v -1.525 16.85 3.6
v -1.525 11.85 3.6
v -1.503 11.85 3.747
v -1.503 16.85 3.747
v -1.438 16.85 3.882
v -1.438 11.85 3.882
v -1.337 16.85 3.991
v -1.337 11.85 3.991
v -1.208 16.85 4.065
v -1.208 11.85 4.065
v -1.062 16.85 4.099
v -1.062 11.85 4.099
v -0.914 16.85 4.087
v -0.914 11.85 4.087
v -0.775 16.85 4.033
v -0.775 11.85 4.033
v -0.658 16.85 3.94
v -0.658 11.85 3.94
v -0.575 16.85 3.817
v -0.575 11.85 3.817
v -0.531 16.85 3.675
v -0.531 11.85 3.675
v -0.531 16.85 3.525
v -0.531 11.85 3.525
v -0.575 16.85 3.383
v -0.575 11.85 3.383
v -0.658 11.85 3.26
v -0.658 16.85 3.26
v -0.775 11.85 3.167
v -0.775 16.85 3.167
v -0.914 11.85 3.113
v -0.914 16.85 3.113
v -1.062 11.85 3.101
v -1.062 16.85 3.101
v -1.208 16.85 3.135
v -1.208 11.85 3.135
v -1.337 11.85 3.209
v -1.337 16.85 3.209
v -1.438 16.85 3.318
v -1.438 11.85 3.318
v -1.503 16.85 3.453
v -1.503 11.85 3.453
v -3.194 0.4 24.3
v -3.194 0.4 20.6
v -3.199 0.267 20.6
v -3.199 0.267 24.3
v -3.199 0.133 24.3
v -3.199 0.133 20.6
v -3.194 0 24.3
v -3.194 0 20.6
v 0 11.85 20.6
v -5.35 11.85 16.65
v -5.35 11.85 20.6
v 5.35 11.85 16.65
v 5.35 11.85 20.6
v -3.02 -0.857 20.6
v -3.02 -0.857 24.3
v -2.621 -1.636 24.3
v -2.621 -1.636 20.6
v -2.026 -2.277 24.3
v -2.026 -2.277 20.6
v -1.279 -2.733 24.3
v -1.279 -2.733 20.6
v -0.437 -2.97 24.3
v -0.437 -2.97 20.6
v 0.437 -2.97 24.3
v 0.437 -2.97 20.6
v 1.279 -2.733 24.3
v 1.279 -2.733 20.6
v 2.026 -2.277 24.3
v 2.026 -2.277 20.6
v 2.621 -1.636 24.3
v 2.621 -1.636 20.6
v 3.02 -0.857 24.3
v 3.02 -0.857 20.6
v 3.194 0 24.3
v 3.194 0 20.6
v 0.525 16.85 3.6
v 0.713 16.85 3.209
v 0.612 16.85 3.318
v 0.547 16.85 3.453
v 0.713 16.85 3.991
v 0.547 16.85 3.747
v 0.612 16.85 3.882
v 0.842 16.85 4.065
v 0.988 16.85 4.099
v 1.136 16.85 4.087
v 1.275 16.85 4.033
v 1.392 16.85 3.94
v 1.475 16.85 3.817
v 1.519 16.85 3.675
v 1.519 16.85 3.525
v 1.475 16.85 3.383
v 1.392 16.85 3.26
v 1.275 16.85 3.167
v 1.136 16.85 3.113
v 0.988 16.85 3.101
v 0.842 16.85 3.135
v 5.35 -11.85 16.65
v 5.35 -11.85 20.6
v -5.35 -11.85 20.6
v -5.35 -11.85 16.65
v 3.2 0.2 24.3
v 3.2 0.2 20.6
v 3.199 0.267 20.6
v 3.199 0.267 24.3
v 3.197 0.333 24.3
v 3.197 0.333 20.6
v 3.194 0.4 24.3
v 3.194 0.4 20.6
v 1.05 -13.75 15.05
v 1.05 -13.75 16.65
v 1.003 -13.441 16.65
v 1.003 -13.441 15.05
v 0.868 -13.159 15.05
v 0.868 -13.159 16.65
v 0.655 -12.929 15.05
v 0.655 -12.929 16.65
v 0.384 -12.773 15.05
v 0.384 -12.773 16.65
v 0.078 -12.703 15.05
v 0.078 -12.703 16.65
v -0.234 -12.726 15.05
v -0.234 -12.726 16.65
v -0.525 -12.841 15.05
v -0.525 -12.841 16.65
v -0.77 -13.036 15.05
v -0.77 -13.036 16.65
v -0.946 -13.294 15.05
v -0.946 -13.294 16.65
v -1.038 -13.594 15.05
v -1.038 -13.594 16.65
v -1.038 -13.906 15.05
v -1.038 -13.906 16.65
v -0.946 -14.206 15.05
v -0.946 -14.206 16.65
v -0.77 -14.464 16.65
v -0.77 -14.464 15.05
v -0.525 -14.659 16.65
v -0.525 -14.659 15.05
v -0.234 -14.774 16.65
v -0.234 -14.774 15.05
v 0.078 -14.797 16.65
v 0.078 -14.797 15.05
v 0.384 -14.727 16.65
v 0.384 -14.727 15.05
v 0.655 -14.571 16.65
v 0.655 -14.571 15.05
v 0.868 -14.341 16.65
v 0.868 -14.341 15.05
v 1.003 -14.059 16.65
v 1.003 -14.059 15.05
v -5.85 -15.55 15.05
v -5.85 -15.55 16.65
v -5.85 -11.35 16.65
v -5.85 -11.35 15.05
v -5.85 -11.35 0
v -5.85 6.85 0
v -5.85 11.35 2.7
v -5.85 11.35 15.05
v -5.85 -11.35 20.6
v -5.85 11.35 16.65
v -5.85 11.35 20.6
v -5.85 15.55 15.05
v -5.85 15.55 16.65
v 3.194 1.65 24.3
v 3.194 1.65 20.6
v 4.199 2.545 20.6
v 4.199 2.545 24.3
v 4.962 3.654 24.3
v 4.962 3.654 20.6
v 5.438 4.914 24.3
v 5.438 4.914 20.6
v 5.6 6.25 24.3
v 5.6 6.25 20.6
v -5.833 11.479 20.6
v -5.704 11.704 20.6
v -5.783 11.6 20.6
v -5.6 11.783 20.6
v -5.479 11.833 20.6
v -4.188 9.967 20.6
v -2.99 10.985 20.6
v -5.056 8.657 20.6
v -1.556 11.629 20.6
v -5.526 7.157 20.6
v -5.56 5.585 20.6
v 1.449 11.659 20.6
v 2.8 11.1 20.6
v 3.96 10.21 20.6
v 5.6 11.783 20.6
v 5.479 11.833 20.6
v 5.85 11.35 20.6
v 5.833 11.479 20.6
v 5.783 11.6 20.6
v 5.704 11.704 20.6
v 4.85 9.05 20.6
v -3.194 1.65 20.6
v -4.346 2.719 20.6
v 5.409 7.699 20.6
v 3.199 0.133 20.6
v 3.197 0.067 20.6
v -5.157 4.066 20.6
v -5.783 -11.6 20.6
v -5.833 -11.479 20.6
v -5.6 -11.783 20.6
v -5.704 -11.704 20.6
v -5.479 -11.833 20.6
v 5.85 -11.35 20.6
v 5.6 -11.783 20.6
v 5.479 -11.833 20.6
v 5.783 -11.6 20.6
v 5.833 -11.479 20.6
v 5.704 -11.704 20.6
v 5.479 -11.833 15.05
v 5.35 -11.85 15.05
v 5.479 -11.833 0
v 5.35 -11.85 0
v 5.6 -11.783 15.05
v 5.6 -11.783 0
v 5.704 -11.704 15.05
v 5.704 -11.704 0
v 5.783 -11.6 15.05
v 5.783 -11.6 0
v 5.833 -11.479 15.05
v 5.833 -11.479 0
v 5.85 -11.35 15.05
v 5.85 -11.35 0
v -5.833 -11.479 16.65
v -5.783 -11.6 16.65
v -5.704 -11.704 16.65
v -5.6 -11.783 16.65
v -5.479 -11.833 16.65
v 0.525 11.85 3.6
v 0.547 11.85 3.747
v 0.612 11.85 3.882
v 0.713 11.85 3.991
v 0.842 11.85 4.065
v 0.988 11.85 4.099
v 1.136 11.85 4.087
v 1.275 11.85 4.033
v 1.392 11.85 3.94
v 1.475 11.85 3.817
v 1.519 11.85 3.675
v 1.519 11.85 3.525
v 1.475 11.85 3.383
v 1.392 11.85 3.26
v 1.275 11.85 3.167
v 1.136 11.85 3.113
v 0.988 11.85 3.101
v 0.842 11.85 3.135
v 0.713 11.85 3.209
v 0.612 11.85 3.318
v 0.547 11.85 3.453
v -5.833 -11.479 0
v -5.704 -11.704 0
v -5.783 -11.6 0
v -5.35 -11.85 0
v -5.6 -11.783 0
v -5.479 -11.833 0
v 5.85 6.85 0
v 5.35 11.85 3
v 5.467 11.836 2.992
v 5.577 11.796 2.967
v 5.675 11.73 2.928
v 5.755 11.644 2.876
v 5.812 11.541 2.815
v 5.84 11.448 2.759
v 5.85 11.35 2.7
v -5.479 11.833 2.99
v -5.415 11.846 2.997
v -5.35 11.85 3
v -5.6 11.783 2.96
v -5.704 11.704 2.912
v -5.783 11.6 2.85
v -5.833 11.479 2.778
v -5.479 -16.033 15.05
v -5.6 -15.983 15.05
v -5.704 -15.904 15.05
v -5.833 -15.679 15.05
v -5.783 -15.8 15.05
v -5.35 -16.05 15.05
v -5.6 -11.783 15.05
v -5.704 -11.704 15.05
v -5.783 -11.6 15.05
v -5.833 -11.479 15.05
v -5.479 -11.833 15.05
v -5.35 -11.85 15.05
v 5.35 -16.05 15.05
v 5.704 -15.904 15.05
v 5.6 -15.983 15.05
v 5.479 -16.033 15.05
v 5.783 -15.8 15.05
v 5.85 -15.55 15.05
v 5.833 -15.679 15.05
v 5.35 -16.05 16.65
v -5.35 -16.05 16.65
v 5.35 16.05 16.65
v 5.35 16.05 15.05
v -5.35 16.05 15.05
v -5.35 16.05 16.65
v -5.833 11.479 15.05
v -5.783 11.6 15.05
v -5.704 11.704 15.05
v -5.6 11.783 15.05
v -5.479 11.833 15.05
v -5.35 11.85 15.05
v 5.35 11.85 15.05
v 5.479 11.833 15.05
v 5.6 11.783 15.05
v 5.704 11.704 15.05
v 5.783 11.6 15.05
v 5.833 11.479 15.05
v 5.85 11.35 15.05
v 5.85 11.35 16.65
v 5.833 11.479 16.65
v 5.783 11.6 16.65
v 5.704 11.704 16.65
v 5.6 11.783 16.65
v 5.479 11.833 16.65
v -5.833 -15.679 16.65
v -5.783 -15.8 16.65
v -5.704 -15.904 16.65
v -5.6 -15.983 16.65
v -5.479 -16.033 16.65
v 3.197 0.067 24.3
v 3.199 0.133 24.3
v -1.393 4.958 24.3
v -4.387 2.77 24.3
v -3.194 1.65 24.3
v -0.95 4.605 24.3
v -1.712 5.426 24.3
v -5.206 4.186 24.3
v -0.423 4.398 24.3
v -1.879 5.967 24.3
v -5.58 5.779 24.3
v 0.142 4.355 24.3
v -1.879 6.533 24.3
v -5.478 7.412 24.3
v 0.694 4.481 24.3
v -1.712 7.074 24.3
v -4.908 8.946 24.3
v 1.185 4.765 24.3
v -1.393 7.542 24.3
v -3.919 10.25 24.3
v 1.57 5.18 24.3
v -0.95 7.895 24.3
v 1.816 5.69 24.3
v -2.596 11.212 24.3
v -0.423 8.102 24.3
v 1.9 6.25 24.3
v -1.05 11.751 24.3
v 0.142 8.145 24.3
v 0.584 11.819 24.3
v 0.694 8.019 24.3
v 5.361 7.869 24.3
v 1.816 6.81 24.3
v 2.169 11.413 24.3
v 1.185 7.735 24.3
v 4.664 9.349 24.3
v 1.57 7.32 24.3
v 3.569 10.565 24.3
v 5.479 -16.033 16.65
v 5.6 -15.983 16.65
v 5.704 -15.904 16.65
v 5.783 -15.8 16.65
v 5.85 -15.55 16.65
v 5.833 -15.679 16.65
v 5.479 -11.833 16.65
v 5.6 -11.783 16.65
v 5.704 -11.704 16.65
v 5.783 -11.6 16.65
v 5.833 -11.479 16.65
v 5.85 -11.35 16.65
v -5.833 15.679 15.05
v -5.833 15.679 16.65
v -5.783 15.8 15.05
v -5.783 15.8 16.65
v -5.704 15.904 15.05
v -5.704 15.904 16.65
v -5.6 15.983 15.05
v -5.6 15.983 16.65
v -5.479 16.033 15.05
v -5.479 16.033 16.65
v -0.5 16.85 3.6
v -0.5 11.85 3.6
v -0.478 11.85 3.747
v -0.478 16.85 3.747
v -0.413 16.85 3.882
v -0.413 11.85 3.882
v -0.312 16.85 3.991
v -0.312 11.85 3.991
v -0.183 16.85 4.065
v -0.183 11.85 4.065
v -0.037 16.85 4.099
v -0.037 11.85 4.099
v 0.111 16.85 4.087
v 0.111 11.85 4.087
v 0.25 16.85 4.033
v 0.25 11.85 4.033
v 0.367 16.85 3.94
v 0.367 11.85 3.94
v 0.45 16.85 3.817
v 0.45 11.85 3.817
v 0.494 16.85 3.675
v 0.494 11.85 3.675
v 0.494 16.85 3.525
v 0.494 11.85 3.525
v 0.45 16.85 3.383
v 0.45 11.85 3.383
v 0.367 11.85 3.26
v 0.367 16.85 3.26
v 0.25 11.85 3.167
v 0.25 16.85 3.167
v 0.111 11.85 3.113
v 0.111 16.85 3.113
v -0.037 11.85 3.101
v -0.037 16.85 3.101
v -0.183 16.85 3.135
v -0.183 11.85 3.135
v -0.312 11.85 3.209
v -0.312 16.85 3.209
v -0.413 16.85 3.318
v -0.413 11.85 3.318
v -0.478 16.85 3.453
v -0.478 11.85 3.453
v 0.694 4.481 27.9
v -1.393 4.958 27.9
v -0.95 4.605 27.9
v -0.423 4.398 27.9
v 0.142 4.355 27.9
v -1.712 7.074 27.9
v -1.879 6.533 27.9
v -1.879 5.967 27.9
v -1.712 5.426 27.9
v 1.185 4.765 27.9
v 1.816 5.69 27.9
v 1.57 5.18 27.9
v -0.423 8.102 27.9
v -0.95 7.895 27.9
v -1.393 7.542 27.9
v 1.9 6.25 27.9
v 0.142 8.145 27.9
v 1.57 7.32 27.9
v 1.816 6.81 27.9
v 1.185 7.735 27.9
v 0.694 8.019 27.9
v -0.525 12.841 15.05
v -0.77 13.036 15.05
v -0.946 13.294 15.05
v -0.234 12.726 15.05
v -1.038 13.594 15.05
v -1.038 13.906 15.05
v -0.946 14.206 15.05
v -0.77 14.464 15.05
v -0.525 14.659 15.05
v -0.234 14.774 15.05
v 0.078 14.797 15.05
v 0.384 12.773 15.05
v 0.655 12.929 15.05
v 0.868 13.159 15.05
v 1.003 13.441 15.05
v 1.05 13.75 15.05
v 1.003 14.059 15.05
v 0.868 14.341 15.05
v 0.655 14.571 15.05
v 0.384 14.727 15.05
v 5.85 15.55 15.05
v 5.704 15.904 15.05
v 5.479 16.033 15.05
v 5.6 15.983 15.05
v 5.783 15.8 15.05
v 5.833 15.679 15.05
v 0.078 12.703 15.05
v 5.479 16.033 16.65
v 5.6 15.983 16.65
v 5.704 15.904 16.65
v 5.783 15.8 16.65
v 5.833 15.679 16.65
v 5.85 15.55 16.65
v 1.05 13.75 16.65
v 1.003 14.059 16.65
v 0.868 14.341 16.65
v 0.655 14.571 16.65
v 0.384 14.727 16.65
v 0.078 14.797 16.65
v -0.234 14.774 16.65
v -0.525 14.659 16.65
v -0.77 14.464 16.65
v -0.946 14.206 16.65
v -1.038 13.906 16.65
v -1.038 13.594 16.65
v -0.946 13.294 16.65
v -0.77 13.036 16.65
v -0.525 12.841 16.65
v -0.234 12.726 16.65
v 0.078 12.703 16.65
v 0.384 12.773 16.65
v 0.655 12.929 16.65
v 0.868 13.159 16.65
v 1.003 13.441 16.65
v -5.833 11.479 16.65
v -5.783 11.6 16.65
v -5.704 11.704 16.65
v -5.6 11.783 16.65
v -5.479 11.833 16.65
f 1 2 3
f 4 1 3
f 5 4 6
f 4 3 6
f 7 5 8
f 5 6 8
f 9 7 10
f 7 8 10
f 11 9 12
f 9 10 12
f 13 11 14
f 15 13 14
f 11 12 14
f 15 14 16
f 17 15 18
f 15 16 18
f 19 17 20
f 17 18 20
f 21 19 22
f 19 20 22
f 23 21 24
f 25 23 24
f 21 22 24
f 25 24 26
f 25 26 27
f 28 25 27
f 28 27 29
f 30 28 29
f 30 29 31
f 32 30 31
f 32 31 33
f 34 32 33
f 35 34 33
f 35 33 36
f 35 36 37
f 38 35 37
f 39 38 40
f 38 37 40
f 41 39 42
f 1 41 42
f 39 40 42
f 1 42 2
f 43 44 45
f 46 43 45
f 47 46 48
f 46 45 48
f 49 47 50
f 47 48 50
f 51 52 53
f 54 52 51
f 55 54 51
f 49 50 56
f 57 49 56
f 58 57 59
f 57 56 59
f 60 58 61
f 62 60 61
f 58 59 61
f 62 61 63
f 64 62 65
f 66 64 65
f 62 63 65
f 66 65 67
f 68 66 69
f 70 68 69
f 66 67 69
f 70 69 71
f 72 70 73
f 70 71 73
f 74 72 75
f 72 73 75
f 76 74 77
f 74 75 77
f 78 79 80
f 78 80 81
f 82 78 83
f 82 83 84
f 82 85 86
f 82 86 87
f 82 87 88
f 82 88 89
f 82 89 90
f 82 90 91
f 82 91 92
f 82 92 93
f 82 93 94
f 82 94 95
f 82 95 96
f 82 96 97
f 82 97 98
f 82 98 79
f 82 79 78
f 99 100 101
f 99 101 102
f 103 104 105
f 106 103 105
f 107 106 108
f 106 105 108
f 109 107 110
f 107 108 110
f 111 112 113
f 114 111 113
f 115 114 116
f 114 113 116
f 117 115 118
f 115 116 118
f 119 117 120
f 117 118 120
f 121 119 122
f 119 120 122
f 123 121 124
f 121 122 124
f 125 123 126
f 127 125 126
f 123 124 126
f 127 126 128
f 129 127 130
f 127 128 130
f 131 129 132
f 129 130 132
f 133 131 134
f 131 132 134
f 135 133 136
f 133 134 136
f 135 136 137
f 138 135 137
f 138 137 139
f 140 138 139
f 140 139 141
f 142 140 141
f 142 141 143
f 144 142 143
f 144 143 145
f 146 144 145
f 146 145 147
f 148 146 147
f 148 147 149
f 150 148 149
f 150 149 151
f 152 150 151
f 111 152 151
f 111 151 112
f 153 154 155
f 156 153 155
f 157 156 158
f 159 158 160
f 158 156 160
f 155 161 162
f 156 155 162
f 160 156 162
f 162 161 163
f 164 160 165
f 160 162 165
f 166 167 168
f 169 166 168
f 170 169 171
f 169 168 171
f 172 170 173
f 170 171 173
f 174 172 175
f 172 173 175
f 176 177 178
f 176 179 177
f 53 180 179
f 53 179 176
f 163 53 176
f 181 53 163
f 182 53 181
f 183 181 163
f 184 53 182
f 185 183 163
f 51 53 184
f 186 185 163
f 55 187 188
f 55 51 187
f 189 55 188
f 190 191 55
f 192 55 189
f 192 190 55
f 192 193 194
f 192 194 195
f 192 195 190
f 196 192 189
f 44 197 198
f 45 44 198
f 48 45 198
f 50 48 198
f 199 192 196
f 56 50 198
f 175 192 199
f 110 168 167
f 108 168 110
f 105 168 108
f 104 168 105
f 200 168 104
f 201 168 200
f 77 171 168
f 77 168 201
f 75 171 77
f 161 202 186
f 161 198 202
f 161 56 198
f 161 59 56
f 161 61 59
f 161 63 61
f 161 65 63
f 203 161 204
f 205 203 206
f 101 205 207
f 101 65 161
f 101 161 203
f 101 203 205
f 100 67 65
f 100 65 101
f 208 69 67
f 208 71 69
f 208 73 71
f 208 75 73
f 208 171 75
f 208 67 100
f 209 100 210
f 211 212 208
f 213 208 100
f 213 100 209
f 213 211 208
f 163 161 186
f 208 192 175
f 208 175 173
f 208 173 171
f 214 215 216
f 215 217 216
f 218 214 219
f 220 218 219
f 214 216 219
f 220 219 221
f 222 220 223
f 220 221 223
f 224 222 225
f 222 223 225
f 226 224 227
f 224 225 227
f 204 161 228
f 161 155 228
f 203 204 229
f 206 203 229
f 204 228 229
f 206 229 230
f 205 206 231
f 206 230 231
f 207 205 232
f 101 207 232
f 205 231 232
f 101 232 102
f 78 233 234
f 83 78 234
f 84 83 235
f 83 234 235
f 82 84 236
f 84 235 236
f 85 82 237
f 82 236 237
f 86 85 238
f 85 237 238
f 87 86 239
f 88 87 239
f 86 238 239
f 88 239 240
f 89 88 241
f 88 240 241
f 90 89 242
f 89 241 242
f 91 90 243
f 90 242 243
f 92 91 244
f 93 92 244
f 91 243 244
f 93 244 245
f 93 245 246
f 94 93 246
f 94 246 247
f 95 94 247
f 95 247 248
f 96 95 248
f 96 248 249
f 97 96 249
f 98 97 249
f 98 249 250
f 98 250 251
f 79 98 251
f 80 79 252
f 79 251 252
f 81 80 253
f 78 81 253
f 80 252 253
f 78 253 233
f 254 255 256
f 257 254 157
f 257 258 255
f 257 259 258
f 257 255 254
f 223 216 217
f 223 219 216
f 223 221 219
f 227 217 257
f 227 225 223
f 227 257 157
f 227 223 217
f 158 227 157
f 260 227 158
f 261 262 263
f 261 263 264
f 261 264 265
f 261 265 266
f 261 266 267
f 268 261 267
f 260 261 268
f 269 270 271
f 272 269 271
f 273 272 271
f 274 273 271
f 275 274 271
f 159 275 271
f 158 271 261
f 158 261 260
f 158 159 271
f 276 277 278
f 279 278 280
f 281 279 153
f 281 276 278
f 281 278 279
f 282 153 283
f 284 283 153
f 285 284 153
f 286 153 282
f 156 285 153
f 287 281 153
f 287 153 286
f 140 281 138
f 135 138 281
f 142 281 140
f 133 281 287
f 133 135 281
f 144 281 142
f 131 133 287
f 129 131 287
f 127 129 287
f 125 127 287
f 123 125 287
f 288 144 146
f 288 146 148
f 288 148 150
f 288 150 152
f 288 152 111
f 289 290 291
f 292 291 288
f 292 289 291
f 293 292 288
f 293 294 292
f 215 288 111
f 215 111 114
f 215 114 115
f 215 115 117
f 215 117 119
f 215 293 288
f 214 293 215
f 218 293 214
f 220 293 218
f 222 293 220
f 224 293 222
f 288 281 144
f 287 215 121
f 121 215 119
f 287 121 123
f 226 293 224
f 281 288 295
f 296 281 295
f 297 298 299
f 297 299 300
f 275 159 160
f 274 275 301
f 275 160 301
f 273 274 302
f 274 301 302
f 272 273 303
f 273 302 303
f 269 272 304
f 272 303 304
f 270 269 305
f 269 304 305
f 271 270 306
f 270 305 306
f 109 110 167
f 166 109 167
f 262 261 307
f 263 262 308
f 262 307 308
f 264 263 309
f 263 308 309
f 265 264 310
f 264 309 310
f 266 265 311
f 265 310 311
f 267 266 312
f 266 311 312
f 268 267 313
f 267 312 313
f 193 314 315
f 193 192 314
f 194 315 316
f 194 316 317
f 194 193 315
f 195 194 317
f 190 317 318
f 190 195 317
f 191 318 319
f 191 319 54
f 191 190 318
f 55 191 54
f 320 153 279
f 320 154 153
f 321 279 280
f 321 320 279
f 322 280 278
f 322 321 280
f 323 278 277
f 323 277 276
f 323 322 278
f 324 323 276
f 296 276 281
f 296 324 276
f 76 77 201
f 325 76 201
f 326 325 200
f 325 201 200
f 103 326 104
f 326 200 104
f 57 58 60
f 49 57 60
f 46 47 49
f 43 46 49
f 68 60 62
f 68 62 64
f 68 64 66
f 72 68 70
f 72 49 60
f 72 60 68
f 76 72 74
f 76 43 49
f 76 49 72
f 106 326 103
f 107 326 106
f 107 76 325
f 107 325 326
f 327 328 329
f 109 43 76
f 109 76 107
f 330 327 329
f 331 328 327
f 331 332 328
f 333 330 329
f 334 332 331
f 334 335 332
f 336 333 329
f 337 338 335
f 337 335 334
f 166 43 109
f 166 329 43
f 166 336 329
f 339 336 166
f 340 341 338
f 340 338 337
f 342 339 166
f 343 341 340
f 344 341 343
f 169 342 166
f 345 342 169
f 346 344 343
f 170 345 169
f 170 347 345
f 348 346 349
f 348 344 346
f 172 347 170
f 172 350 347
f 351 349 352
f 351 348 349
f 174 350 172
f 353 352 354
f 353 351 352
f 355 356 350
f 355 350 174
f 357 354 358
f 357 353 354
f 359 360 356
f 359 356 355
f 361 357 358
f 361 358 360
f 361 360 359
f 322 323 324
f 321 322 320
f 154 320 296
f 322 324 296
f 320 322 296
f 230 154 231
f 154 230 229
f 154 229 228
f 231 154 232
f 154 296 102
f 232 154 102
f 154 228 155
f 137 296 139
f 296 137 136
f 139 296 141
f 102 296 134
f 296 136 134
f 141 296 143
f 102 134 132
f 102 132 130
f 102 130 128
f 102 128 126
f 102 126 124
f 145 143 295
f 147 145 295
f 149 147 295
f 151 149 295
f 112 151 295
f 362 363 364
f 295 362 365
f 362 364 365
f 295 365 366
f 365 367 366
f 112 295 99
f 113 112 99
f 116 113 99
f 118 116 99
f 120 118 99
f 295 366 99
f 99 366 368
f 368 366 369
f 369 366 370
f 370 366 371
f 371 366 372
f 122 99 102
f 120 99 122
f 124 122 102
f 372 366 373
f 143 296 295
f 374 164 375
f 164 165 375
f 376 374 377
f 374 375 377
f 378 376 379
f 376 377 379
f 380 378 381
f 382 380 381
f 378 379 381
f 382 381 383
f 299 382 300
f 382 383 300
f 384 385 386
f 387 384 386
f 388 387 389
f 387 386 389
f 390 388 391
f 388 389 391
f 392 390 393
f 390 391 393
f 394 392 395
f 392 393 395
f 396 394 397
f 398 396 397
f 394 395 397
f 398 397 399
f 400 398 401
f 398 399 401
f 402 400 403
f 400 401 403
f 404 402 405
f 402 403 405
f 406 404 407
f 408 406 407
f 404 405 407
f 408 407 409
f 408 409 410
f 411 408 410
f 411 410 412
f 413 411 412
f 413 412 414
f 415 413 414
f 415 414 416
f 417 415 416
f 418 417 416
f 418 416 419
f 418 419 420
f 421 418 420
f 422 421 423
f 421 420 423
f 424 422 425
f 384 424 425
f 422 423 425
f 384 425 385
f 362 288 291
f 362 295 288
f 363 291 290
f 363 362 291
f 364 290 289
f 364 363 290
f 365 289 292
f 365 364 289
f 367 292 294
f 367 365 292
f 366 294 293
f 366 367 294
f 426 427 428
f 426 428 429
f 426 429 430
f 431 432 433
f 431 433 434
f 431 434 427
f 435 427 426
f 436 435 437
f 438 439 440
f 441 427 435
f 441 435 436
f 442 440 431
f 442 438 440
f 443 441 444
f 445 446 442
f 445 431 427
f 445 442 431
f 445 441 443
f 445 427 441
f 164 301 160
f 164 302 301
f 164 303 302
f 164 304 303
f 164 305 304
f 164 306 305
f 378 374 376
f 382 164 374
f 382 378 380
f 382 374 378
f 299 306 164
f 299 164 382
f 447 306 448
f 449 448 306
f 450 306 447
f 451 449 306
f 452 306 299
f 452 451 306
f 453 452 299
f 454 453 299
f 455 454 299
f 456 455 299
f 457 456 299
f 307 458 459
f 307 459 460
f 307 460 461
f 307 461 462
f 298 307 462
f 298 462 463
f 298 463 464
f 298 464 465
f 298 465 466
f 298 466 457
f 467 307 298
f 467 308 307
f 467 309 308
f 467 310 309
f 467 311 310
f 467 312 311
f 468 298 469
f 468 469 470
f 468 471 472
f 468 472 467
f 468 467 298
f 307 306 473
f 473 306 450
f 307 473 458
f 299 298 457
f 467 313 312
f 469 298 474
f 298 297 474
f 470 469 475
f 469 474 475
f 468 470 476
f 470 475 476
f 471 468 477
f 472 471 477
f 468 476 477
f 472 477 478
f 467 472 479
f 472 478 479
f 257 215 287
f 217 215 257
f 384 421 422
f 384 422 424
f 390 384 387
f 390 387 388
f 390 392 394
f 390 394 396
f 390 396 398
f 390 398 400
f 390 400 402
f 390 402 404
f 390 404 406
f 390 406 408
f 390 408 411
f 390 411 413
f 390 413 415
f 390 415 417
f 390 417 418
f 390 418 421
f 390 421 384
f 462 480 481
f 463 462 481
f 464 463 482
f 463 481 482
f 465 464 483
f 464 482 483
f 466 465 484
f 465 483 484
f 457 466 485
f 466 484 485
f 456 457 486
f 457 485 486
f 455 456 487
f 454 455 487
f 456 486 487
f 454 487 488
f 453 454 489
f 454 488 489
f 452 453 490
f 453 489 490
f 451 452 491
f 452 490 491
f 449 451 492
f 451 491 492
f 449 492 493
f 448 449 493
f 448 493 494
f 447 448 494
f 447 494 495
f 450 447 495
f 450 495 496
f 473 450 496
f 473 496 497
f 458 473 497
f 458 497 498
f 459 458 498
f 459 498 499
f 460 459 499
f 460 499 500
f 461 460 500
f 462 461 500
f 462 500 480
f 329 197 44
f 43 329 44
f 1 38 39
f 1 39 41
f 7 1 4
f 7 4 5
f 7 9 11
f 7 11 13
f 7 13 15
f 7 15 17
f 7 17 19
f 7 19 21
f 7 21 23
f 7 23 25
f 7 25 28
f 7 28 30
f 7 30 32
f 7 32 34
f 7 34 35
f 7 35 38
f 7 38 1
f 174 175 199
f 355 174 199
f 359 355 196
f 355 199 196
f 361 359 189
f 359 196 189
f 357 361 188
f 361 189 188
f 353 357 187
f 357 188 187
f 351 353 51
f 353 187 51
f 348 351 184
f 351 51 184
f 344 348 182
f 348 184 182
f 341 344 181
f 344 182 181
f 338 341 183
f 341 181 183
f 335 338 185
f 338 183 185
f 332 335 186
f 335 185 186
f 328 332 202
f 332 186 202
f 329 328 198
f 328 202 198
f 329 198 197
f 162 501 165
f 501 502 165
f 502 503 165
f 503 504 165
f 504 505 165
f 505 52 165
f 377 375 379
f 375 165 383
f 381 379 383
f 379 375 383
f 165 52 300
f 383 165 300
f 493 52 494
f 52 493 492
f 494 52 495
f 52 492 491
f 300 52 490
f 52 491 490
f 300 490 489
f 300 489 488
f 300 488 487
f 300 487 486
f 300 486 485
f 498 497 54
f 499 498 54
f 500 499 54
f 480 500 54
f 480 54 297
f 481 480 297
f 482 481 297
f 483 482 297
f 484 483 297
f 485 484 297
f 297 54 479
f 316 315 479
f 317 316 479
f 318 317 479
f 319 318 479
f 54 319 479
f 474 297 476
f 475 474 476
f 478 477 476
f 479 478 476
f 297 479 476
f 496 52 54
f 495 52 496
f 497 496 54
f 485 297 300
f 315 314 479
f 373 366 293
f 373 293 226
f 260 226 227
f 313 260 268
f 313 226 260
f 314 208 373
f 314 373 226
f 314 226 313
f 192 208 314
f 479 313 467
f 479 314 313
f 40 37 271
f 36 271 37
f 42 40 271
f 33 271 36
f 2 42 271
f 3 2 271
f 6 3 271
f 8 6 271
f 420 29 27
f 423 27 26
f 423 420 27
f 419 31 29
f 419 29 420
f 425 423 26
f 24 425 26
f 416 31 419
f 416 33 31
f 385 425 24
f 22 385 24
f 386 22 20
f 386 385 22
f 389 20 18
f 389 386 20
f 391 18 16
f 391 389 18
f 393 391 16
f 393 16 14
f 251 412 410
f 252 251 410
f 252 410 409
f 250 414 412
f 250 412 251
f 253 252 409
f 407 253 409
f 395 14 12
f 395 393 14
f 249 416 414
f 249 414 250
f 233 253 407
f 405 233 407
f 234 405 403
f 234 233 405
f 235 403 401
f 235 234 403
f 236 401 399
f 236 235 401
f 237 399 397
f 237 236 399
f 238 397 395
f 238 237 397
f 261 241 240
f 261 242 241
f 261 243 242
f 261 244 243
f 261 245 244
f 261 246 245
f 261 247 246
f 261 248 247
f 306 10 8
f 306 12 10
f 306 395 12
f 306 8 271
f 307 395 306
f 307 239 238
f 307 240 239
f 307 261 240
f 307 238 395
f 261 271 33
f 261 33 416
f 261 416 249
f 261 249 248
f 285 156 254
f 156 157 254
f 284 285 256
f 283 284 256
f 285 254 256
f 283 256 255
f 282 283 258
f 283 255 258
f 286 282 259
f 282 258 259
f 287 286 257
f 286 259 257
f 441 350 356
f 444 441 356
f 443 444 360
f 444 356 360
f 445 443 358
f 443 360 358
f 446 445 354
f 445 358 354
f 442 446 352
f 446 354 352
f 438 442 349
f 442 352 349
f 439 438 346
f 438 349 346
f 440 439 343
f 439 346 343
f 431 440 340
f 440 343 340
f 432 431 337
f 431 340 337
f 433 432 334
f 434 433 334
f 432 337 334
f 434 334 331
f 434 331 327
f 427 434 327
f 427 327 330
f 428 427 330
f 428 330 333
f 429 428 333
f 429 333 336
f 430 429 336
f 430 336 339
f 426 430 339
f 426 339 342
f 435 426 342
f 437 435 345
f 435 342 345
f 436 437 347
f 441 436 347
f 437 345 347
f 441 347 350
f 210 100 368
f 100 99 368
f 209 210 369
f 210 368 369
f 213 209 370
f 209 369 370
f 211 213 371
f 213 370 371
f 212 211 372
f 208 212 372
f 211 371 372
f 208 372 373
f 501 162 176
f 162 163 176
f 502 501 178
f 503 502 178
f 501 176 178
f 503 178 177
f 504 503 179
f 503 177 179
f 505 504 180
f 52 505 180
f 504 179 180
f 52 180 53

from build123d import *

# Parameters (mm, degrees)
F0_W          = 4.2
F0_H          = 1.6
F1_DEPTH      = 5.85
F1_DEPTH_BACK = 5.85
F3_DEPTH      = 3.7
F4_R          = 1.9
F5_DEPTH      = 3.6
F6_R          = 1.05
F7_DEPTH      = 10
F9_DEPTH      = 25
F9_DEPTH_BACK = 25
F10_R         = 0.5
F11_R         = 0.5
F12_DEPTH     = 5


with BuildPart() as f1:
    # F0 (on Right) → F1 (new body, two sides)
    with BuildSketch(Plane.YZ) as f1_sk:
        with Locations((-13.95, 15.85)):
            Rectangle(F0_W, F0_H)
        with Locations((13.95, 15.85)):
            Rectangle(F0_W, F0_H)
        Polygon((11.85, 20.6), (-11.85, 20.6), (-11.85, 16.65), (-11.85, 15.05), (-11.85, 0), (11.85, 0), (11.85, 15.05), (11.85, 16.65), align=None)
    extrude(amount=F1_DEPTH)
    extrude(f1_sk.sketch, amount=-F1_DEPTH_BACK)

    # F2 (on face) → F3 (join)
    with BuildSketch(Plane.XY.offset(20.6)):
        with BuildLine():
            ThreePointArc((3.1937438845, 1.65), (4.9621046822, 3.6543272311), (5.6, 6.25))
            ThreePointArc((5.6, 6.25), (-2.5956727689, 11.2121046822), (-3.1937438845, 1.65))
            ThreePointArc((-3.1937438845, 1.65), (-3.064580666, 1.5629598528), (-2.9330467827, 1.4795454545))
            ThreePointArc((-2.9330467827, 1.4795454545), (0, 3.4), (2.9330467827, 1.4795454545))
            ThreePointArc((2.9330467827, 1.4795454545), (3.064580666, 1.5629598528), (3.1937438845, 1.65))
        make_face()
        with BuildLine():
            ThreePointArc((-2.9330467827, 1.4795454545), (-3.064580666, 1.5629598528), (-3.1937438845, 1.65))
            Line((-3.1937438845, 1.65), (-3.1937438845, 0.4))
            ThreePointArc((-3.1937438845, 0.4), (-3.1105860488, 0.9511687112), (-2.9330467827, 1.4795454545))
        make_face()
        with BuildLine():
            Line((3.1937438845, 0.4), (3.1937438845, 1.65))
            ThreePointArc((3.1937438845, 1.65), (3.064580666, 1.5629598528), (2.9330467827, 1.4795454545))
            ThreePointArc((2.9330467827, 1.4795454545), (3.1105860488, 0.9511687112), (3.1937438845, 0.4))
        make_face()
        with BuildLine():
            ThreePointArc((2.9330467827, 1.4795454545), (0, 0.65), (-2.9330467827, 1.4795454545))
            ThreePointArc((-2.9330467827, 1.4795454545), (-3.1105860488, 0.9511687112), (-3.1937438845, 0.4))
            Line((-3.1937438845, 0.4), (-3.1937438845, 0))
            ThreePointArc((-3.1937438845, 0), (0, -3), (3.1937438845, 0))
            Line((3.1937438845, 0), (3.1937438845, 0.4))
            ThreePointArc((3.1937438845, 0.4), (3.1105860488, 0.9511687112), (2.9330467827, 1.4795454545))
        make_face()
        with BuildLine():
            Line((-3.1937438845, 0), (-3.1937438845, 0.4))
            ThreePointArc((-3.1937438845, 0.4), (-3.2, 0.2), (-3.1937438845, 0))
        make_face()
        with BuildLine():
            ThreePointArc((3.2, 0.2), (3.1984355887, 0.3000489118), (3.1937438845, 0.4))
            Line((3.1937438845, 0.4), (3.1937438845, 0))
            ThreePointArc((3.1937438845, 0), (3.1984355887, 0.0999510882), (3.2, 0.2))
        make_face()
        with BuildLine():
            ThreePointArc((-2.9330467827, 1.4795454545), (0, 0.65), (2.9330467827, 1.4795454545))
            ThreePointArc((2.9330467827, 1.4795454545), (0, 3.4), (-2.9330467827, 1.4795454545))
        make_face()
    extrude(amount=F3_DEPTH)

    # F4 (on face) → F5 (join)
    with BuildSketch(Plane.XY.offset(24.3)):
        with Locations((0, 6.25)):
            Circle(F4_R)
    extrude(amount=F5_DEPTH)

    # F6 (on face) → F7 (cut)
    with BuildSketch(Plane.XY.offset(16.65)):
        with Locations((0, 13.75)):
            Circle(F6_R)
        with Locations((0, -13.75)):
            Circle(F6_R)
    extrude(amount=-F7_DEPTH, mode=Mode.SUBTRACT)

    # F8 (on Right) → F9 (cut, two sides)
    with BuildSketch(Plane.YZ) as f9_sk:
        Polygon((11.85, 3), (6.85, 0), (11.85, 0), align=None)
    extrude(amount=-F9_DEPTH, mode=Mode.SUBTRACT)
    extrude(f9_sk.sketch, amount=F9_DEPTH_BACK, mode=Mode.SUBTRACT)

    # F10
    f10_edges = [f1.edges().sort_by_distance(p)[0] for p in [
        (5.85, -11.85, 18.625),
        (-5.85, -11.85, 18.625),
        (-5.85, -11.85, 7.525),
        (5.85, -11.85, 7.525),
        (5.85, 11.85, 18.625),
        (-5.85, 11.85, 18.625),
        (-5.85, 11.85, 9.025),
        (5.85, 11.85, 9.025),
        (5.85, 16.05, 15.85),
        (-5.85, 16.05, 15.85),
        (5.85, -16.05, 15.85),
        (-5.85, -16.05, 15.85),
    ]]
    fillet(f10_edges, radius=F10_R)

    # F11 (on face) → F12 (join)
    with BuildSketch(Plane(origin=(0, 11.85, 0), x_dir=(-1, 0, 0), z_dir=(0, 1, 0))):
        with Locations((0, 3.6)):
            Circle(F11_R)
        with Locations((1.025, 3.6)):
            Circle(F11_R)
        with Locations((-1.025, 3.6)):
            Circle(F11_R)
    extrude(amount=F12_DEPTH)


solid = f1.part
